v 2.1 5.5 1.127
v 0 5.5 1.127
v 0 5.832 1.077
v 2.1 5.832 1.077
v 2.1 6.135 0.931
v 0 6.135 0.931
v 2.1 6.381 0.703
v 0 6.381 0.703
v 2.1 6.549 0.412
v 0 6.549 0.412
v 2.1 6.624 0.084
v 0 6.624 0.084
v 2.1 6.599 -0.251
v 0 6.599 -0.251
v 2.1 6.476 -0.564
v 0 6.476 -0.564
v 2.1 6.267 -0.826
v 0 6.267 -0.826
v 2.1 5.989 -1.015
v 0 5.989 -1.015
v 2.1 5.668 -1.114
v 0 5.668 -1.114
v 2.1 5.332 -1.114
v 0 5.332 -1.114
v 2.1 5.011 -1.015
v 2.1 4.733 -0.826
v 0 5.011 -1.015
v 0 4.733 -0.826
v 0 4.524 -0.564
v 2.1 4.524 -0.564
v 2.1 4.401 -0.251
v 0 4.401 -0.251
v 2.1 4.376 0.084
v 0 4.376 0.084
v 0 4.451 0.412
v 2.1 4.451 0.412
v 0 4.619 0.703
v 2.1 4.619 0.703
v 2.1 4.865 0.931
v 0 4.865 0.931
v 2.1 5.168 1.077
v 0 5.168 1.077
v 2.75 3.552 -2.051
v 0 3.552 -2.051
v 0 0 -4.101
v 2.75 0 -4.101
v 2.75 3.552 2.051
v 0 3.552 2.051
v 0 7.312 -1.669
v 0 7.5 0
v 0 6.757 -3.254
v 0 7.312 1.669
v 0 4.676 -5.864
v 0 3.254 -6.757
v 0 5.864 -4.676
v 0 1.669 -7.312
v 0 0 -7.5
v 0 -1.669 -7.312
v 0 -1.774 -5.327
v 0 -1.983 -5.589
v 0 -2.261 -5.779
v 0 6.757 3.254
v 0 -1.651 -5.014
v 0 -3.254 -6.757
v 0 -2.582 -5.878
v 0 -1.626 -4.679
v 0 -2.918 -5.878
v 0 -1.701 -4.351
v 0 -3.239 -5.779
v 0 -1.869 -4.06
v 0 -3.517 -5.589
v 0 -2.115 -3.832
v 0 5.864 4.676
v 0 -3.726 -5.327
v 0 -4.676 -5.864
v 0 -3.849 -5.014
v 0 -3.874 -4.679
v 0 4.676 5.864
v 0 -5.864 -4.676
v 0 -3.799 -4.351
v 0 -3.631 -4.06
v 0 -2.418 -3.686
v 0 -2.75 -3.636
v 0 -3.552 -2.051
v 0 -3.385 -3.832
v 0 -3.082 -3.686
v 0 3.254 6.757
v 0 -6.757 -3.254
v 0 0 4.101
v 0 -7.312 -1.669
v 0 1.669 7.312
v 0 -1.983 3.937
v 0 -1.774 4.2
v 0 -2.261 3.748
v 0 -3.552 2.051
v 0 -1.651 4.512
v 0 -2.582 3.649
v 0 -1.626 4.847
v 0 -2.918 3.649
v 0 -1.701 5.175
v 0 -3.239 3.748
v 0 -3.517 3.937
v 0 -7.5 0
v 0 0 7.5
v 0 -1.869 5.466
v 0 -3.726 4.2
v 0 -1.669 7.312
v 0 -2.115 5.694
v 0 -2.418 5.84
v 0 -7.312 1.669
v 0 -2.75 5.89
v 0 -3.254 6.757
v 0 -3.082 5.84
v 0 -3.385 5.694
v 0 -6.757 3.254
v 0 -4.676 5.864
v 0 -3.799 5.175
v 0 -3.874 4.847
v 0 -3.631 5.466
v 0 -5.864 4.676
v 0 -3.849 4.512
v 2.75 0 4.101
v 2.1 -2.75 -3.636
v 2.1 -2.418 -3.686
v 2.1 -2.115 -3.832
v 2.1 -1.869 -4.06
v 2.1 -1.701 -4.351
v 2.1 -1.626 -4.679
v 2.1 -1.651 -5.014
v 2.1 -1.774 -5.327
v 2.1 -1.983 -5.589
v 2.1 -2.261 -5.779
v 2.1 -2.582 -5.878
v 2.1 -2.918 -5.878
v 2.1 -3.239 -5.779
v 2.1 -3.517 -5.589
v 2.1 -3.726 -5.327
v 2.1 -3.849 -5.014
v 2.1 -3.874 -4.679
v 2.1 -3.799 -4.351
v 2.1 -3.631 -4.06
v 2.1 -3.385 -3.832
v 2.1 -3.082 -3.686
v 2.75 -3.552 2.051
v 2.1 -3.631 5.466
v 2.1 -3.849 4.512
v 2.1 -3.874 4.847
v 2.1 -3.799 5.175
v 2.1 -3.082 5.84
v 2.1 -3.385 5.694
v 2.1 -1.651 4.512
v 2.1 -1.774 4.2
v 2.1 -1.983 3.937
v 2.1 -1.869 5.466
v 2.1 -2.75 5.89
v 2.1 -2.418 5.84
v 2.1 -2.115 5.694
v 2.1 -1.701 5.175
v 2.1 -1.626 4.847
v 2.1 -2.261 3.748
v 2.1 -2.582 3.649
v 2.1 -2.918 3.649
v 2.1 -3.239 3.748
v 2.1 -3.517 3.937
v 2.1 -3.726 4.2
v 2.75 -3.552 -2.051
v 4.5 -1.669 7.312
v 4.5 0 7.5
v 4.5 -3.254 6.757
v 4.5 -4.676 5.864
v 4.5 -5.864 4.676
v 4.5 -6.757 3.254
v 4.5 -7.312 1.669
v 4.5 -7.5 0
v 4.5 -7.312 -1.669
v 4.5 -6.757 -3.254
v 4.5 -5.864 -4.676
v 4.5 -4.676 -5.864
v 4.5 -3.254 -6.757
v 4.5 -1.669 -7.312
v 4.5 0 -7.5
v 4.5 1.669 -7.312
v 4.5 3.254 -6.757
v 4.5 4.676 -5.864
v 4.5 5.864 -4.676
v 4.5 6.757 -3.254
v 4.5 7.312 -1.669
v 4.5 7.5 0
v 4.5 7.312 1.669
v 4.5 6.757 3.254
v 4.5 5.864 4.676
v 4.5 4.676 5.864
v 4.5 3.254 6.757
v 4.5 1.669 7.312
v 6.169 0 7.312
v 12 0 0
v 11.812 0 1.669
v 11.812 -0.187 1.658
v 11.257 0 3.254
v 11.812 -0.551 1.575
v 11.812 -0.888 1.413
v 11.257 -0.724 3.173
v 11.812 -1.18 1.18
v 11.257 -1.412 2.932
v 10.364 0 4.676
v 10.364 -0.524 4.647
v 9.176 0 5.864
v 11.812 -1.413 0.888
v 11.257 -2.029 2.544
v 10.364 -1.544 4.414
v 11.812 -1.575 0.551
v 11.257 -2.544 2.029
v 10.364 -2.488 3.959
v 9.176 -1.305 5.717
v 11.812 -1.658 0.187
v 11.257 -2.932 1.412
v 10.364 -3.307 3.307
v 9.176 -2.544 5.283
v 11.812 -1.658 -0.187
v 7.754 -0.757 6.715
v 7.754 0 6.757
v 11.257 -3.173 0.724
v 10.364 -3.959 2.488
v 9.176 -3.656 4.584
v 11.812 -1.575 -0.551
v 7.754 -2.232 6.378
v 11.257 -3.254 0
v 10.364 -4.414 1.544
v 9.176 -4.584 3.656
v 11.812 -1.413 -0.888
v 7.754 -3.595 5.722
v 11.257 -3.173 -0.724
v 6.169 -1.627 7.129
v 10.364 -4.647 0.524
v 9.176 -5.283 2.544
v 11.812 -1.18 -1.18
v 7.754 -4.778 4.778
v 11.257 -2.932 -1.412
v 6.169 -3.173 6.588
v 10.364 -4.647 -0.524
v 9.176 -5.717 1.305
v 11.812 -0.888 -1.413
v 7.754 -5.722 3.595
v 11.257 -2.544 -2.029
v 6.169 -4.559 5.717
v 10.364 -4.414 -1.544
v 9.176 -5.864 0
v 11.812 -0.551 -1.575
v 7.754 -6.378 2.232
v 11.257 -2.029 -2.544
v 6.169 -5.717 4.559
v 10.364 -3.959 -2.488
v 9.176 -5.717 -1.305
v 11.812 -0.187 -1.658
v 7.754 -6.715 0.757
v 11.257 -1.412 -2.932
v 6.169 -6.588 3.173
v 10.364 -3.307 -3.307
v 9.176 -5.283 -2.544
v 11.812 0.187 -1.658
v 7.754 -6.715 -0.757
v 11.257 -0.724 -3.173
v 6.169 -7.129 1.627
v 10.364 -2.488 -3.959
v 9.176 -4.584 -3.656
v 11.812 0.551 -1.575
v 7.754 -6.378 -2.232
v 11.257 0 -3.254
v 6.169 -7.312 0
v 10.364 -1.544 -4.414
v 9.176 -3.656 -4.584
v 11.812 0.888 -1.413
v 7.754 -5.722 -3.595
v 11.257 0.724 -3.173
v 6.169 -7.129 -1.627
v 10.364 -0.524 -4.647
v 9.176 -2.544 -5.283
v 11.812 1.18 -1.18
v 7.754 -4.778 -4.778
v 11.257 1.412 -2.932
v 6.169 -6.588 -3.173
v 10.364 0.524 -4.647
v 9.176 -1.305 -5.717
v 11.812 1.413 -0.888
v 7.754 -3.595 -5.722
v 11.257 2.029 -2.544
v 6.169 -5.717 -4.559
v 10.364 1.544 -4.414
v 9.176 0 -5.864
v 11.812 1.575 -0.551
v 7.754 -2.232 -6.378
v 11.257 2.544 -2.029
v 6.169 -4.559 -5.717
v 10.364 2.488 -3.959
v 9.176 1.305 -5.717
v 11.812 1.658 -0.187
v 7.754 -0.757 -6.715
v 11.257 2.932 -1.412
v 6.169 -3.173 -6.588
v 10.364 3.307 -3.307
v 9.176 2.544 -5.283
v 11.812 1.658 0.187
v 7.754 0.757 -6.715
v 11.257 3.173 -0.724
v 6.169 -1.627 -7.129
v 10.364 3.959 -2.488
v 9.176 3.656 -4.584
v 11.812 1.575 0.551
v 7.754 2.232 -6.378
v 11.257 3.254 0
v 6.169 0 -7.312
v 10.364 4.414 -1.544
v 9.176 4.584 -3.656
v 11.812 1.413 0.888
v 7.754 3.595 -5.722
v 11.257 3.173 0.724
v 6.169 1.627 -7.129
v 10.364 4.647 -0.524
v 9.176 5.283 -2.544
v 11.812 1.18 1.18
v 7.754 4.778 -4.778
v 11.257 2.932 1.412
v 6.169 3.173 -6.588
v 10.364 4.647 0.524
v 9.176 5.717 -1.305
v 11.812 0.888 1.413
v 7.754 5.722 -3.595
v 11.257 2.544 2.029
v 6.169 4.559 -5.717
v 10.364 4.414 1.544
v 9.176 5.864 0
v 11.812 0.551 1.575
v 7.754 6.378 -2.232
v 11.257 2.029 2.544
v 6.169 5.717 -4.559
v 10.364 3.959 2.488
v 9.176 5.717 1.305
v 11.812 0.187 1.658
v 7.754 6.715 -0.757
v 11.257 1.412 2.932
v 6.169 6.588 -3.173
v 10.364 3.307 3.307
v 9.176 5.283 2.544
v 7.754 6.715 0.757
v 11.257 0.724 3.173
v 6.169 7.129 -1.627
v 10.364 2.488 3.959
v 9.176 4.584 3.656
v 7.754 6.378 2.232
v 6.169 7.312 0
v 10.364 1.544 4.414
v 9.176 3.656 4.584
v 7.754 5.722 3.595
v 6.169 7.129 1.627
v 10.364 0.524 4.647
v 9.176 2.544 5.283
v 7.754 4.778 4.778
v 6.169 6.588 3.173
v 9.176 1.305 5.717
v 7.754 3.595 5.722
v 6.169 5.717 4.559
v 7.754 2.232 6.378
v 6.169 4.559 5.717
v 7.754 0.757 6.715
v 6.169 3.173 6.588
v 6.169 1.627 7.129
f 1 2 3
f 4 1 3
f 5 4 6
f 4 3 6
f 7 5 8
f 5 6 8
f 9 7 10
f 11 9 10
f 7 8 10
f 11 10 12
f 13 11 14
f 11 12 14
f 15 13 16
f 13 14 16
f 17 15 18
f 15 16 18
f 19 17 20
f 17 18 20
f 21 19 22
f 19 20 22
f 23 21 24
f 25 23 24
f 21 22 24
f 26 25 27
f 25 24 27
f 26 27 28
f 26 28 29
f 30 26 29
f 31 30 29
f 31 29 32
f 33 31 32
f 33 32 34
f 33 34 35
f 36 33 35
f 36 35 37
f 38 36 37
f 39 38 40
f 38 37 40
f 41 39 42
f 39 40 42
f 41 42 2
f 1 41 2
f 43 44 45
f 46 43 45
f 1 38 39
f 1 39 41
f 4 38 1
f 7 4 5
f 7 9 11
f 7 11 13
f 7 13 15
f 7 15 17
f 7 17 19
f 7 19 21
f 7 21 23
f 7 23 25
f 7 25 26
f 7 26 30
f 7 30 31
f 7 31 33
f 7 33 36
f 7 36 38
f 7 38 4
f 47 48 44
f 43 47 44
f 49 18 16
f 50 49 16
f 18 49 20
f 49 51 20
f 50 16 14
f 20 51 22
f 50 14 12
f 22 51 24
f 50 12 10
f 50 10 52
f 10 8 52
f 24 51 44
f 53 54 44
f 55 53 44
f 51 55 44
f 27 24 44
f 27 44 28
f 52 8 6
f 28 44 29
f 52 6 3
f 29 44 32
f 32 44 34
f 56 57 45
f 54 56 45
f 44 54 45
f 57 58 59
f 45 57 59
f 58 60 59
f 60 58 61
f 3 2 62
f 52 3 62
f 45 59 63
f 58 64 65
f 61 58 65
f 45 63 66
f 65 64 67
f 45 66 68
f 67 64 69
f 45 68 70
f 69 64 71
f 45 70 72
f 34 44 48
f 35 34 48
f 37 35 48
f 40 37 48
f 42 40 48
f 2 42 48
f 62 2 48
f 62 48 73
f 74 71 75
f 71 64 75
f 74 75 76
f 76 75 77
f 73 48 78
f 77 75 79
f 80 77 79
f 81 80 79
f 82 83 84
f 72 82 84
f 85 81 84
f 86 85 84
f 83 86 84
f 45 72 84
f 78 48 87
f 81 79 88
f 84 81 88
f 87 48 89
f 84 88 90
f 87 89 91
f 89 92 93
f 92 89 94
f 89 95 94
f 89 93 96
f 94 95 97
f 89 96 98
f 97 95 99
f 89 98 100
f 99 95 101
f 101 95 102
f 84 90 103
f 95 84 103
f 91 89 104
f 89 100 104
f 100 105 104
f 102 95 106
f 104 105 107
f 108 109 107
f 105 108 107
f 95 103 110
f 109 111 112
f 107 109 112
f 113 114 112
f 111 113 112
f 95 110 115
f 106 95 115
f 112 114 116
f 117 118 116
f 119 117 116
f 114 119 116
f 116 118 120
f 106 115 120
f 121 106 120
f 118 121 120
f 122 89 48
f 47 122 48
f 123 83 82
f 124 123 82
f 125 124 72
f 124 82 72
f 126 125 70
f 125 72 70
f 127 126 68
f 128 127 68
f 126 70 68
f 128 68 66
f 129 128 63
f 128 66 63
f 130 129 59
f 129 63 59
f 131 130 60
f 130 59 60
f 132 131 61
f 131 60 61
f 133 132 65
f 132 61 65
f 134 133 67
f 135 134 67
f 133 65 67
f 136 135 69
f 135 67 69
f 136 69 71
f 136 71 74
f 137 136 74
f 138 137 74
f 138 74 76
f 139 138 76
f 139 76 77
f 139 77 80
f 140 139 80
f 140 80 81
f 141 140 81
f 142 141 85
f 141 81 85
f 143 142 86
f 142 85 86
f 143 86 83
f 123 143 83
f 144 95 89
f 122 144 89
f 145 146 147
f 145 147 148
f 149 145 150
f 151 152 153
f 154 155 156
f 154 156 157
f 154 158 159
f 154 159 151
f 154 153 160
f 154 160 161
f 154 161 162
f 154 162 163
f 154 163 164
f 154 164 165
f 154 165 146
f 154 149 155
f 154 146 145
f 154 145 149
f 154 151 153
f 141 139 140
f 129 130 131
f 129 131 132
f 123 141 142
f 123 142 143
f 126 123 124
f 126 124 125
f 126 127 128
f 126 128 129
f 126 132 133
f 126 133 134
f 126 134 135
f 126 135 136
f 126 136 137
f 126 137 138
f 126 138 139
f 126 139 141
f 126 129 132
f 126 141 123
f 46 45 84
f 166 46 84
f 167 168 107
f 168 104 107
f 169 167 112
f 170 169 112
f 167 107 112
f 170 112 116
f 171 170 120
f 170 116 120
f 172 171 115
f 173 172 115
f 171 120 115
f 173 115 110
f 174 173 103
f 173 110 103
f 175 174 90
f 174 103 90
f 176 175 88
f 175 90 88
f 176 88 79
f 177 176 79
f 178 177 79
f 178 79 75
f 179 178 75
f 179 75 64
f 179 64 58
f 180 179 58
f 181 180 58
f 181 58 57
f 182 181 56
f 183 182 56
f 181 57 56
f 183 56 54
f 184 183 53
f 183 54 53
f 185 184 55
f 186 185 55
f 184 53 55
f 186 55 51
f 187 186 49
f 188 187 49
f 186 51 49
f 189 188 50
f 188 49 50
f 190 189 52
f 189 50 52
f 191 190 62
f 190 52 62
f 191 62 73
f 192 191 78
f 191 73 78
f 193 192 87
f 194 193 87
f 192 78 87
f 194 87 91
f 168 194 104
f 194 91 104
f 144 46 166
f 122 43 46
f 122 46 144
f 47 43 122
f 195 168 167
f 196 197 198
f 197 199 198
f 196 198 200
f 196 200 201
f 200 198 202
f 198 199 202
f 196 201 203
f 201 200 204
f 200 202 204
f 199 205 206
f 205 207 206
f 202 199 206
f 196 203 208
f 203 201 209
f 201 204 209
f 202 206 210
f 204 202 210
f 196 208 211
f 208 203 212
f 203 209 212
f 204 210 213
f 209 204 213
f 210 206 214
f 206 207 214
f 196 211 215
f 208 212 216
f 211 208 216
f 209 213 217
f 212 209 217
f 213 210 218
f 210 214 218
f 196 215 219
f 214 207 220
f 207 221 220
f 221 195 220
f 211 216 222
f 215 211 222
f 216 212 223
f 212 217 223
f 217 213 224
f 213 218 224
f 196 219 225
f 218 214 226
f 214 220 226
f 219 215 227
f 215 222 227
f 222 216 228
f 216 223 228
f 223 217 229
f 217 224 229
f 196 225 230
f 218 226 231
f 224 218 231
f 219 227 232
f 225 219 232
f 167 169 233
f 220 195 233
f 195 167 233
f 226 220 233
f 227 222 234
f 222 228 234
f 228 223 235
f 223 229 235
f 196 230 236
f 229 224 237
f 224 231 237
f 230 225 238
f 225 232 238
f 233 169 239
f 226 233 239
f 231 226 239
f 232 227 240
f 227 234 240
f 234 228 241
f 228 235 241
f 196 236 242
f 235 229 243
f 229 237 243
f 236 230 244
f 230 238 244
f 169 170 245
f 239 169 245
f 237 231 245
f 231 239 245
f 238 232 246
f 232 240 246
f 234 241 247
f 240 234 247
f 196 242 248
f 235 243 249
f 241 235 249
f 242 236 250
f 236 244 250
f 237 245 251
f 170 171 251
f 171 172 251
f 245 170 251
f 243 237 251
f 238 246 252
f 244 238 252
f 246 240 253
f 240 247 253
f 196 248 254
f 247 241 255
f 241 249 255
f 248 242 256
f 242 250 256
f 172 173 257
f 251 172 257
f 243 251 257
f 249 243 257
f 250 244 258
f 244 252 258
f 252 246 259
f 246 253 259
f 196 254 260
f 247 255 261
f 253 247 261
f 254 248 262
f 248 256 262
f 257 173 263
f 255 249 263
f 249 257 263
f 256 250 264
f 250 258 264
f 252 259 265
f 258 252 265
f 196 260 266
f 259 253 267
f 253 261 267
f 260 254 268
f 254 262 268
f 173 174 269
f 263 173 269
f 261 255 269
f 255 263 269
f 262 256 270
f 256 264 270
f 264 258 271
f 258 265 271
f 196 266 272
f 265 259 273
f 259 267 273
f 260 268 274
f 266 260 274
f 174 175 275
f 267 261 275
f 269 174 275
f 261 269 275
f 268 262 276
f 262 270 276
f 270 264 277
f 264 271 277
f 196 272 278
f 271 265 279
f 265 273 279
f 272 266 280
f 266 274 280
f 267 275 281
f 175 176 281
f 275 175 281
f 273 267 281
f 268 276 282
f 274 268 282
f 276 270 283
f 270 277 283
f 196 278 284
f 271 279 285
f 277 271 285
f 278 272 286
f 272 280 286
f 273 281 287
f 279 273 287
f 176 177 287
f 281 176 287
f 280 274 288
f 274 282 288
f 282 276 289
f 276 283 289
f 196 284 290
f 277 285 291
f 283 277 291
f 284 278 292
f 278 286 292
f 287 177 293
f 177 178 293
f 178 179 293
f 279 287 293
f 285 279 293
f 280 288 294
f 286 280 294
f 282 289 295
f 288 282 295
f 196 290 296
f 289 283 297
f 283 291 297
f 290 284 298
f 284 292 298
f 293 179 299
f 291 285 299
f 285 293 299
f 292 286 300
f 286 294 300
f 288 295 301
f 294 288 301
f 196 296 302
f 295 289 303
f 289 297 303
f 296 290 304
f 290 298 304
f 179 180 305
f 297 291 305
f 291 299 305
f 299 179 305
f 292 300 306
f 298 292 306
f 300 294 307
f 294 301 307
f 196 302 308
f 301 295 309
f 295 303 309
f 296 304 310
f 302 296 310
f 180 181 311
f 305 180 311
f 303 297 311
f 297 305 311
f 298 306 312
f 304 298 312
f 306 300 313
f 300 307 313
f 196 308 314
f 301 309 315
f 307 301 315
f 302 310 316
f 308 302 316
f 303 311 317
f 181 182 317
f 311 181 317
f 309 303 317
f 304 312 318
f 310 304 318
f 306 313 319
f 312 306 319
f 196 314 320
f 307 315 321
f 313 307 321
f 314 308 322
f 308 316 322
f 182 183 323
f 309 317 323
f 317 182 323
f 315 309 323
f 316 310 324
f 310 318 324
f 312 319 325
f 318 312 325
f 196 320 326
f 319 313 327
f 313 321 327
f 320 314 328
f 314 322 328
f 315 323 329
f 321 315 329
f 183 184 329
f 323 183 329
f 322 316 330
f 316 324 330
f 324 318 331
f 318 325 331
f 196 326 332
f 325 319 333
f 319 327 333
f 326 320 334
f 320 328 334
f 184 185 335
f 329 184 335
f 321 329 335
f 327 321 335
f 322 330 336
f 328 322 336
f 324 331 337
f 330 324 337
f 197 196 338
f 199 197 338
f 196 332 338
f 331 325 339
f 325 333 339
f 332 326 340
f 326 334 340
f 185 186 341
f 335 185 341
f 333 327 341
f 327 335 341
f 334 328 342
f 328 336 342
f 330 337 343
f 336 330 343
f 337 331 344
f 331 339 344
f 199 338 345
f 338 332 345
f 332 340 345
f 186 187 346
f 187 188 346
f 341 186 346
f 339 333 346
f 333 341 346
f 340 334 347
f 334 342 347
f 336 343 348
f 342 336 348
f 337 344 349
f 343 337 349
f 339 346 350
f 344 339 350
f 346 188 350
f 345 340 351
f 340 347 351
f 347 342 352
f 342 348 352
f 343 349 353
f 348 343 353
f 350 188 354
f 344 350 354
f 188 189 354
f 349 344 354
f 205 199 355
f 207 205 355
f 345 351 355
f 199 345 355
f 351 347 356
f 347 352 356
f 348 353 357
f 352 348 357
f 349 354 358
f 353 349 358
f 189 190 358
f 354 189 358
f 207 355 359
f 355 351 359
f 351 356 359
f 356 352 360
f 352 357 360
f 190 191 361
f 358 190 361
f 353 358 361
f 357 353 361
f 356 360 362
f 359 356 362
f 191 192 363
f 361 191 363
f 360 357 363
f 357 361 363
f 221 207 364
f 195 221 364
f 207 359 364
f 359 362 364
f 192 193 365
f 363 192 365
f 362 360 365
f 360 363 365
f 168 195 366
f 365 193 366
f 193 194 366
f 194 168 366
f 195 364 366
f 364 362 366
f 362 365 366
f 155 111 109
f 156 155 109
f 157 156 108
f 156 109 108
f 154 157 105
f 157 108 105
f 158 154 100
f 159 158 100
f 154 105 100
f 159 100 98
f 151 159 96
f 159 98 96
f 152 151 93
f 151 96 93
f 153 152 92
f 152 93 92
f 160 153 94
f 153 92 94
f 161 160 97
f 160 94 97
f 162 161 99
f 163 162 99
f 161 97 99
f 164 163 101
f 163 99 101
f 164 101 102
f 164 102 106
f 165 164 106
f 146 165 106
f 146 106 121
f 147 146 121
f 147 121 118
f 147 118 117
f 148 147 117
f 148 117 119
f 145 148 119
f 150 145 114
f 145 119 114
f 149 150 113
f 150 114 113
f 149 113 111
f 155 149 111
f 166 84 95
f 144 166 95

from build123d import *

# Parameters (mm, degrees)
CUT_EXTRUDE1_DEPTH = 2.75
SKETCH3_R          = 1.127
CUT_EXTRUDE2_DEPTH = 2.1


with BuildPart() as part:
    # Sketch1 → Revolve1 (revolve)
    with BuildSketch(Plane.XY, mode=Mode.PRIVATE) as revolve1_sk:
        with BuildLine():
            Line((0, 0), (12, 0))
            ThreePointArc((12, 0), (9.803300859, -5.303300859), (4.5, -7.5))
            Line((4.5, -7.5), (0, -7.5))
            Line((0, -7.5), (0, 0))
        make_face()
    revolve(revolve1_sk.sketch.rotate(Axis((0, 0, 0), (1, 0, 0)), 270), axis=Axis((0, 0, 0), (1, 0, 0)))

    # Sketch2 → Cut-Extrude1 (cut)
    with BuildSketch(Plane.ZY):
        Polygon((2.050748156, 3.552), (-2.050748156, 3.552), (-4.101496312, 0), (-2.050748156, -3.552), (2.050748156, -3.552), (4.101496312, 0), align=None)
    extrude(amount=-CUT_EXTRUDE1_DEPTH, mode=Mode.SUBTRACT)

    # Sketch3 → Cut-Extrude2 (cut)
    with BuildSketch(Plane.ZY):
        with Locations((-4.763139721, -2.75)):
            Circle(SKETCH3_R)
        with Locations((0, 5.5)):
            Circle(SKETCH3_R)
        with Locations((4.763139721, -2.75)):
            Circle(SKETCH3_R)
    extrude(amount=-CUT_EXTRUDE2_DEPTH, mode=Mode.SUBTRACT)


solid = part.part
